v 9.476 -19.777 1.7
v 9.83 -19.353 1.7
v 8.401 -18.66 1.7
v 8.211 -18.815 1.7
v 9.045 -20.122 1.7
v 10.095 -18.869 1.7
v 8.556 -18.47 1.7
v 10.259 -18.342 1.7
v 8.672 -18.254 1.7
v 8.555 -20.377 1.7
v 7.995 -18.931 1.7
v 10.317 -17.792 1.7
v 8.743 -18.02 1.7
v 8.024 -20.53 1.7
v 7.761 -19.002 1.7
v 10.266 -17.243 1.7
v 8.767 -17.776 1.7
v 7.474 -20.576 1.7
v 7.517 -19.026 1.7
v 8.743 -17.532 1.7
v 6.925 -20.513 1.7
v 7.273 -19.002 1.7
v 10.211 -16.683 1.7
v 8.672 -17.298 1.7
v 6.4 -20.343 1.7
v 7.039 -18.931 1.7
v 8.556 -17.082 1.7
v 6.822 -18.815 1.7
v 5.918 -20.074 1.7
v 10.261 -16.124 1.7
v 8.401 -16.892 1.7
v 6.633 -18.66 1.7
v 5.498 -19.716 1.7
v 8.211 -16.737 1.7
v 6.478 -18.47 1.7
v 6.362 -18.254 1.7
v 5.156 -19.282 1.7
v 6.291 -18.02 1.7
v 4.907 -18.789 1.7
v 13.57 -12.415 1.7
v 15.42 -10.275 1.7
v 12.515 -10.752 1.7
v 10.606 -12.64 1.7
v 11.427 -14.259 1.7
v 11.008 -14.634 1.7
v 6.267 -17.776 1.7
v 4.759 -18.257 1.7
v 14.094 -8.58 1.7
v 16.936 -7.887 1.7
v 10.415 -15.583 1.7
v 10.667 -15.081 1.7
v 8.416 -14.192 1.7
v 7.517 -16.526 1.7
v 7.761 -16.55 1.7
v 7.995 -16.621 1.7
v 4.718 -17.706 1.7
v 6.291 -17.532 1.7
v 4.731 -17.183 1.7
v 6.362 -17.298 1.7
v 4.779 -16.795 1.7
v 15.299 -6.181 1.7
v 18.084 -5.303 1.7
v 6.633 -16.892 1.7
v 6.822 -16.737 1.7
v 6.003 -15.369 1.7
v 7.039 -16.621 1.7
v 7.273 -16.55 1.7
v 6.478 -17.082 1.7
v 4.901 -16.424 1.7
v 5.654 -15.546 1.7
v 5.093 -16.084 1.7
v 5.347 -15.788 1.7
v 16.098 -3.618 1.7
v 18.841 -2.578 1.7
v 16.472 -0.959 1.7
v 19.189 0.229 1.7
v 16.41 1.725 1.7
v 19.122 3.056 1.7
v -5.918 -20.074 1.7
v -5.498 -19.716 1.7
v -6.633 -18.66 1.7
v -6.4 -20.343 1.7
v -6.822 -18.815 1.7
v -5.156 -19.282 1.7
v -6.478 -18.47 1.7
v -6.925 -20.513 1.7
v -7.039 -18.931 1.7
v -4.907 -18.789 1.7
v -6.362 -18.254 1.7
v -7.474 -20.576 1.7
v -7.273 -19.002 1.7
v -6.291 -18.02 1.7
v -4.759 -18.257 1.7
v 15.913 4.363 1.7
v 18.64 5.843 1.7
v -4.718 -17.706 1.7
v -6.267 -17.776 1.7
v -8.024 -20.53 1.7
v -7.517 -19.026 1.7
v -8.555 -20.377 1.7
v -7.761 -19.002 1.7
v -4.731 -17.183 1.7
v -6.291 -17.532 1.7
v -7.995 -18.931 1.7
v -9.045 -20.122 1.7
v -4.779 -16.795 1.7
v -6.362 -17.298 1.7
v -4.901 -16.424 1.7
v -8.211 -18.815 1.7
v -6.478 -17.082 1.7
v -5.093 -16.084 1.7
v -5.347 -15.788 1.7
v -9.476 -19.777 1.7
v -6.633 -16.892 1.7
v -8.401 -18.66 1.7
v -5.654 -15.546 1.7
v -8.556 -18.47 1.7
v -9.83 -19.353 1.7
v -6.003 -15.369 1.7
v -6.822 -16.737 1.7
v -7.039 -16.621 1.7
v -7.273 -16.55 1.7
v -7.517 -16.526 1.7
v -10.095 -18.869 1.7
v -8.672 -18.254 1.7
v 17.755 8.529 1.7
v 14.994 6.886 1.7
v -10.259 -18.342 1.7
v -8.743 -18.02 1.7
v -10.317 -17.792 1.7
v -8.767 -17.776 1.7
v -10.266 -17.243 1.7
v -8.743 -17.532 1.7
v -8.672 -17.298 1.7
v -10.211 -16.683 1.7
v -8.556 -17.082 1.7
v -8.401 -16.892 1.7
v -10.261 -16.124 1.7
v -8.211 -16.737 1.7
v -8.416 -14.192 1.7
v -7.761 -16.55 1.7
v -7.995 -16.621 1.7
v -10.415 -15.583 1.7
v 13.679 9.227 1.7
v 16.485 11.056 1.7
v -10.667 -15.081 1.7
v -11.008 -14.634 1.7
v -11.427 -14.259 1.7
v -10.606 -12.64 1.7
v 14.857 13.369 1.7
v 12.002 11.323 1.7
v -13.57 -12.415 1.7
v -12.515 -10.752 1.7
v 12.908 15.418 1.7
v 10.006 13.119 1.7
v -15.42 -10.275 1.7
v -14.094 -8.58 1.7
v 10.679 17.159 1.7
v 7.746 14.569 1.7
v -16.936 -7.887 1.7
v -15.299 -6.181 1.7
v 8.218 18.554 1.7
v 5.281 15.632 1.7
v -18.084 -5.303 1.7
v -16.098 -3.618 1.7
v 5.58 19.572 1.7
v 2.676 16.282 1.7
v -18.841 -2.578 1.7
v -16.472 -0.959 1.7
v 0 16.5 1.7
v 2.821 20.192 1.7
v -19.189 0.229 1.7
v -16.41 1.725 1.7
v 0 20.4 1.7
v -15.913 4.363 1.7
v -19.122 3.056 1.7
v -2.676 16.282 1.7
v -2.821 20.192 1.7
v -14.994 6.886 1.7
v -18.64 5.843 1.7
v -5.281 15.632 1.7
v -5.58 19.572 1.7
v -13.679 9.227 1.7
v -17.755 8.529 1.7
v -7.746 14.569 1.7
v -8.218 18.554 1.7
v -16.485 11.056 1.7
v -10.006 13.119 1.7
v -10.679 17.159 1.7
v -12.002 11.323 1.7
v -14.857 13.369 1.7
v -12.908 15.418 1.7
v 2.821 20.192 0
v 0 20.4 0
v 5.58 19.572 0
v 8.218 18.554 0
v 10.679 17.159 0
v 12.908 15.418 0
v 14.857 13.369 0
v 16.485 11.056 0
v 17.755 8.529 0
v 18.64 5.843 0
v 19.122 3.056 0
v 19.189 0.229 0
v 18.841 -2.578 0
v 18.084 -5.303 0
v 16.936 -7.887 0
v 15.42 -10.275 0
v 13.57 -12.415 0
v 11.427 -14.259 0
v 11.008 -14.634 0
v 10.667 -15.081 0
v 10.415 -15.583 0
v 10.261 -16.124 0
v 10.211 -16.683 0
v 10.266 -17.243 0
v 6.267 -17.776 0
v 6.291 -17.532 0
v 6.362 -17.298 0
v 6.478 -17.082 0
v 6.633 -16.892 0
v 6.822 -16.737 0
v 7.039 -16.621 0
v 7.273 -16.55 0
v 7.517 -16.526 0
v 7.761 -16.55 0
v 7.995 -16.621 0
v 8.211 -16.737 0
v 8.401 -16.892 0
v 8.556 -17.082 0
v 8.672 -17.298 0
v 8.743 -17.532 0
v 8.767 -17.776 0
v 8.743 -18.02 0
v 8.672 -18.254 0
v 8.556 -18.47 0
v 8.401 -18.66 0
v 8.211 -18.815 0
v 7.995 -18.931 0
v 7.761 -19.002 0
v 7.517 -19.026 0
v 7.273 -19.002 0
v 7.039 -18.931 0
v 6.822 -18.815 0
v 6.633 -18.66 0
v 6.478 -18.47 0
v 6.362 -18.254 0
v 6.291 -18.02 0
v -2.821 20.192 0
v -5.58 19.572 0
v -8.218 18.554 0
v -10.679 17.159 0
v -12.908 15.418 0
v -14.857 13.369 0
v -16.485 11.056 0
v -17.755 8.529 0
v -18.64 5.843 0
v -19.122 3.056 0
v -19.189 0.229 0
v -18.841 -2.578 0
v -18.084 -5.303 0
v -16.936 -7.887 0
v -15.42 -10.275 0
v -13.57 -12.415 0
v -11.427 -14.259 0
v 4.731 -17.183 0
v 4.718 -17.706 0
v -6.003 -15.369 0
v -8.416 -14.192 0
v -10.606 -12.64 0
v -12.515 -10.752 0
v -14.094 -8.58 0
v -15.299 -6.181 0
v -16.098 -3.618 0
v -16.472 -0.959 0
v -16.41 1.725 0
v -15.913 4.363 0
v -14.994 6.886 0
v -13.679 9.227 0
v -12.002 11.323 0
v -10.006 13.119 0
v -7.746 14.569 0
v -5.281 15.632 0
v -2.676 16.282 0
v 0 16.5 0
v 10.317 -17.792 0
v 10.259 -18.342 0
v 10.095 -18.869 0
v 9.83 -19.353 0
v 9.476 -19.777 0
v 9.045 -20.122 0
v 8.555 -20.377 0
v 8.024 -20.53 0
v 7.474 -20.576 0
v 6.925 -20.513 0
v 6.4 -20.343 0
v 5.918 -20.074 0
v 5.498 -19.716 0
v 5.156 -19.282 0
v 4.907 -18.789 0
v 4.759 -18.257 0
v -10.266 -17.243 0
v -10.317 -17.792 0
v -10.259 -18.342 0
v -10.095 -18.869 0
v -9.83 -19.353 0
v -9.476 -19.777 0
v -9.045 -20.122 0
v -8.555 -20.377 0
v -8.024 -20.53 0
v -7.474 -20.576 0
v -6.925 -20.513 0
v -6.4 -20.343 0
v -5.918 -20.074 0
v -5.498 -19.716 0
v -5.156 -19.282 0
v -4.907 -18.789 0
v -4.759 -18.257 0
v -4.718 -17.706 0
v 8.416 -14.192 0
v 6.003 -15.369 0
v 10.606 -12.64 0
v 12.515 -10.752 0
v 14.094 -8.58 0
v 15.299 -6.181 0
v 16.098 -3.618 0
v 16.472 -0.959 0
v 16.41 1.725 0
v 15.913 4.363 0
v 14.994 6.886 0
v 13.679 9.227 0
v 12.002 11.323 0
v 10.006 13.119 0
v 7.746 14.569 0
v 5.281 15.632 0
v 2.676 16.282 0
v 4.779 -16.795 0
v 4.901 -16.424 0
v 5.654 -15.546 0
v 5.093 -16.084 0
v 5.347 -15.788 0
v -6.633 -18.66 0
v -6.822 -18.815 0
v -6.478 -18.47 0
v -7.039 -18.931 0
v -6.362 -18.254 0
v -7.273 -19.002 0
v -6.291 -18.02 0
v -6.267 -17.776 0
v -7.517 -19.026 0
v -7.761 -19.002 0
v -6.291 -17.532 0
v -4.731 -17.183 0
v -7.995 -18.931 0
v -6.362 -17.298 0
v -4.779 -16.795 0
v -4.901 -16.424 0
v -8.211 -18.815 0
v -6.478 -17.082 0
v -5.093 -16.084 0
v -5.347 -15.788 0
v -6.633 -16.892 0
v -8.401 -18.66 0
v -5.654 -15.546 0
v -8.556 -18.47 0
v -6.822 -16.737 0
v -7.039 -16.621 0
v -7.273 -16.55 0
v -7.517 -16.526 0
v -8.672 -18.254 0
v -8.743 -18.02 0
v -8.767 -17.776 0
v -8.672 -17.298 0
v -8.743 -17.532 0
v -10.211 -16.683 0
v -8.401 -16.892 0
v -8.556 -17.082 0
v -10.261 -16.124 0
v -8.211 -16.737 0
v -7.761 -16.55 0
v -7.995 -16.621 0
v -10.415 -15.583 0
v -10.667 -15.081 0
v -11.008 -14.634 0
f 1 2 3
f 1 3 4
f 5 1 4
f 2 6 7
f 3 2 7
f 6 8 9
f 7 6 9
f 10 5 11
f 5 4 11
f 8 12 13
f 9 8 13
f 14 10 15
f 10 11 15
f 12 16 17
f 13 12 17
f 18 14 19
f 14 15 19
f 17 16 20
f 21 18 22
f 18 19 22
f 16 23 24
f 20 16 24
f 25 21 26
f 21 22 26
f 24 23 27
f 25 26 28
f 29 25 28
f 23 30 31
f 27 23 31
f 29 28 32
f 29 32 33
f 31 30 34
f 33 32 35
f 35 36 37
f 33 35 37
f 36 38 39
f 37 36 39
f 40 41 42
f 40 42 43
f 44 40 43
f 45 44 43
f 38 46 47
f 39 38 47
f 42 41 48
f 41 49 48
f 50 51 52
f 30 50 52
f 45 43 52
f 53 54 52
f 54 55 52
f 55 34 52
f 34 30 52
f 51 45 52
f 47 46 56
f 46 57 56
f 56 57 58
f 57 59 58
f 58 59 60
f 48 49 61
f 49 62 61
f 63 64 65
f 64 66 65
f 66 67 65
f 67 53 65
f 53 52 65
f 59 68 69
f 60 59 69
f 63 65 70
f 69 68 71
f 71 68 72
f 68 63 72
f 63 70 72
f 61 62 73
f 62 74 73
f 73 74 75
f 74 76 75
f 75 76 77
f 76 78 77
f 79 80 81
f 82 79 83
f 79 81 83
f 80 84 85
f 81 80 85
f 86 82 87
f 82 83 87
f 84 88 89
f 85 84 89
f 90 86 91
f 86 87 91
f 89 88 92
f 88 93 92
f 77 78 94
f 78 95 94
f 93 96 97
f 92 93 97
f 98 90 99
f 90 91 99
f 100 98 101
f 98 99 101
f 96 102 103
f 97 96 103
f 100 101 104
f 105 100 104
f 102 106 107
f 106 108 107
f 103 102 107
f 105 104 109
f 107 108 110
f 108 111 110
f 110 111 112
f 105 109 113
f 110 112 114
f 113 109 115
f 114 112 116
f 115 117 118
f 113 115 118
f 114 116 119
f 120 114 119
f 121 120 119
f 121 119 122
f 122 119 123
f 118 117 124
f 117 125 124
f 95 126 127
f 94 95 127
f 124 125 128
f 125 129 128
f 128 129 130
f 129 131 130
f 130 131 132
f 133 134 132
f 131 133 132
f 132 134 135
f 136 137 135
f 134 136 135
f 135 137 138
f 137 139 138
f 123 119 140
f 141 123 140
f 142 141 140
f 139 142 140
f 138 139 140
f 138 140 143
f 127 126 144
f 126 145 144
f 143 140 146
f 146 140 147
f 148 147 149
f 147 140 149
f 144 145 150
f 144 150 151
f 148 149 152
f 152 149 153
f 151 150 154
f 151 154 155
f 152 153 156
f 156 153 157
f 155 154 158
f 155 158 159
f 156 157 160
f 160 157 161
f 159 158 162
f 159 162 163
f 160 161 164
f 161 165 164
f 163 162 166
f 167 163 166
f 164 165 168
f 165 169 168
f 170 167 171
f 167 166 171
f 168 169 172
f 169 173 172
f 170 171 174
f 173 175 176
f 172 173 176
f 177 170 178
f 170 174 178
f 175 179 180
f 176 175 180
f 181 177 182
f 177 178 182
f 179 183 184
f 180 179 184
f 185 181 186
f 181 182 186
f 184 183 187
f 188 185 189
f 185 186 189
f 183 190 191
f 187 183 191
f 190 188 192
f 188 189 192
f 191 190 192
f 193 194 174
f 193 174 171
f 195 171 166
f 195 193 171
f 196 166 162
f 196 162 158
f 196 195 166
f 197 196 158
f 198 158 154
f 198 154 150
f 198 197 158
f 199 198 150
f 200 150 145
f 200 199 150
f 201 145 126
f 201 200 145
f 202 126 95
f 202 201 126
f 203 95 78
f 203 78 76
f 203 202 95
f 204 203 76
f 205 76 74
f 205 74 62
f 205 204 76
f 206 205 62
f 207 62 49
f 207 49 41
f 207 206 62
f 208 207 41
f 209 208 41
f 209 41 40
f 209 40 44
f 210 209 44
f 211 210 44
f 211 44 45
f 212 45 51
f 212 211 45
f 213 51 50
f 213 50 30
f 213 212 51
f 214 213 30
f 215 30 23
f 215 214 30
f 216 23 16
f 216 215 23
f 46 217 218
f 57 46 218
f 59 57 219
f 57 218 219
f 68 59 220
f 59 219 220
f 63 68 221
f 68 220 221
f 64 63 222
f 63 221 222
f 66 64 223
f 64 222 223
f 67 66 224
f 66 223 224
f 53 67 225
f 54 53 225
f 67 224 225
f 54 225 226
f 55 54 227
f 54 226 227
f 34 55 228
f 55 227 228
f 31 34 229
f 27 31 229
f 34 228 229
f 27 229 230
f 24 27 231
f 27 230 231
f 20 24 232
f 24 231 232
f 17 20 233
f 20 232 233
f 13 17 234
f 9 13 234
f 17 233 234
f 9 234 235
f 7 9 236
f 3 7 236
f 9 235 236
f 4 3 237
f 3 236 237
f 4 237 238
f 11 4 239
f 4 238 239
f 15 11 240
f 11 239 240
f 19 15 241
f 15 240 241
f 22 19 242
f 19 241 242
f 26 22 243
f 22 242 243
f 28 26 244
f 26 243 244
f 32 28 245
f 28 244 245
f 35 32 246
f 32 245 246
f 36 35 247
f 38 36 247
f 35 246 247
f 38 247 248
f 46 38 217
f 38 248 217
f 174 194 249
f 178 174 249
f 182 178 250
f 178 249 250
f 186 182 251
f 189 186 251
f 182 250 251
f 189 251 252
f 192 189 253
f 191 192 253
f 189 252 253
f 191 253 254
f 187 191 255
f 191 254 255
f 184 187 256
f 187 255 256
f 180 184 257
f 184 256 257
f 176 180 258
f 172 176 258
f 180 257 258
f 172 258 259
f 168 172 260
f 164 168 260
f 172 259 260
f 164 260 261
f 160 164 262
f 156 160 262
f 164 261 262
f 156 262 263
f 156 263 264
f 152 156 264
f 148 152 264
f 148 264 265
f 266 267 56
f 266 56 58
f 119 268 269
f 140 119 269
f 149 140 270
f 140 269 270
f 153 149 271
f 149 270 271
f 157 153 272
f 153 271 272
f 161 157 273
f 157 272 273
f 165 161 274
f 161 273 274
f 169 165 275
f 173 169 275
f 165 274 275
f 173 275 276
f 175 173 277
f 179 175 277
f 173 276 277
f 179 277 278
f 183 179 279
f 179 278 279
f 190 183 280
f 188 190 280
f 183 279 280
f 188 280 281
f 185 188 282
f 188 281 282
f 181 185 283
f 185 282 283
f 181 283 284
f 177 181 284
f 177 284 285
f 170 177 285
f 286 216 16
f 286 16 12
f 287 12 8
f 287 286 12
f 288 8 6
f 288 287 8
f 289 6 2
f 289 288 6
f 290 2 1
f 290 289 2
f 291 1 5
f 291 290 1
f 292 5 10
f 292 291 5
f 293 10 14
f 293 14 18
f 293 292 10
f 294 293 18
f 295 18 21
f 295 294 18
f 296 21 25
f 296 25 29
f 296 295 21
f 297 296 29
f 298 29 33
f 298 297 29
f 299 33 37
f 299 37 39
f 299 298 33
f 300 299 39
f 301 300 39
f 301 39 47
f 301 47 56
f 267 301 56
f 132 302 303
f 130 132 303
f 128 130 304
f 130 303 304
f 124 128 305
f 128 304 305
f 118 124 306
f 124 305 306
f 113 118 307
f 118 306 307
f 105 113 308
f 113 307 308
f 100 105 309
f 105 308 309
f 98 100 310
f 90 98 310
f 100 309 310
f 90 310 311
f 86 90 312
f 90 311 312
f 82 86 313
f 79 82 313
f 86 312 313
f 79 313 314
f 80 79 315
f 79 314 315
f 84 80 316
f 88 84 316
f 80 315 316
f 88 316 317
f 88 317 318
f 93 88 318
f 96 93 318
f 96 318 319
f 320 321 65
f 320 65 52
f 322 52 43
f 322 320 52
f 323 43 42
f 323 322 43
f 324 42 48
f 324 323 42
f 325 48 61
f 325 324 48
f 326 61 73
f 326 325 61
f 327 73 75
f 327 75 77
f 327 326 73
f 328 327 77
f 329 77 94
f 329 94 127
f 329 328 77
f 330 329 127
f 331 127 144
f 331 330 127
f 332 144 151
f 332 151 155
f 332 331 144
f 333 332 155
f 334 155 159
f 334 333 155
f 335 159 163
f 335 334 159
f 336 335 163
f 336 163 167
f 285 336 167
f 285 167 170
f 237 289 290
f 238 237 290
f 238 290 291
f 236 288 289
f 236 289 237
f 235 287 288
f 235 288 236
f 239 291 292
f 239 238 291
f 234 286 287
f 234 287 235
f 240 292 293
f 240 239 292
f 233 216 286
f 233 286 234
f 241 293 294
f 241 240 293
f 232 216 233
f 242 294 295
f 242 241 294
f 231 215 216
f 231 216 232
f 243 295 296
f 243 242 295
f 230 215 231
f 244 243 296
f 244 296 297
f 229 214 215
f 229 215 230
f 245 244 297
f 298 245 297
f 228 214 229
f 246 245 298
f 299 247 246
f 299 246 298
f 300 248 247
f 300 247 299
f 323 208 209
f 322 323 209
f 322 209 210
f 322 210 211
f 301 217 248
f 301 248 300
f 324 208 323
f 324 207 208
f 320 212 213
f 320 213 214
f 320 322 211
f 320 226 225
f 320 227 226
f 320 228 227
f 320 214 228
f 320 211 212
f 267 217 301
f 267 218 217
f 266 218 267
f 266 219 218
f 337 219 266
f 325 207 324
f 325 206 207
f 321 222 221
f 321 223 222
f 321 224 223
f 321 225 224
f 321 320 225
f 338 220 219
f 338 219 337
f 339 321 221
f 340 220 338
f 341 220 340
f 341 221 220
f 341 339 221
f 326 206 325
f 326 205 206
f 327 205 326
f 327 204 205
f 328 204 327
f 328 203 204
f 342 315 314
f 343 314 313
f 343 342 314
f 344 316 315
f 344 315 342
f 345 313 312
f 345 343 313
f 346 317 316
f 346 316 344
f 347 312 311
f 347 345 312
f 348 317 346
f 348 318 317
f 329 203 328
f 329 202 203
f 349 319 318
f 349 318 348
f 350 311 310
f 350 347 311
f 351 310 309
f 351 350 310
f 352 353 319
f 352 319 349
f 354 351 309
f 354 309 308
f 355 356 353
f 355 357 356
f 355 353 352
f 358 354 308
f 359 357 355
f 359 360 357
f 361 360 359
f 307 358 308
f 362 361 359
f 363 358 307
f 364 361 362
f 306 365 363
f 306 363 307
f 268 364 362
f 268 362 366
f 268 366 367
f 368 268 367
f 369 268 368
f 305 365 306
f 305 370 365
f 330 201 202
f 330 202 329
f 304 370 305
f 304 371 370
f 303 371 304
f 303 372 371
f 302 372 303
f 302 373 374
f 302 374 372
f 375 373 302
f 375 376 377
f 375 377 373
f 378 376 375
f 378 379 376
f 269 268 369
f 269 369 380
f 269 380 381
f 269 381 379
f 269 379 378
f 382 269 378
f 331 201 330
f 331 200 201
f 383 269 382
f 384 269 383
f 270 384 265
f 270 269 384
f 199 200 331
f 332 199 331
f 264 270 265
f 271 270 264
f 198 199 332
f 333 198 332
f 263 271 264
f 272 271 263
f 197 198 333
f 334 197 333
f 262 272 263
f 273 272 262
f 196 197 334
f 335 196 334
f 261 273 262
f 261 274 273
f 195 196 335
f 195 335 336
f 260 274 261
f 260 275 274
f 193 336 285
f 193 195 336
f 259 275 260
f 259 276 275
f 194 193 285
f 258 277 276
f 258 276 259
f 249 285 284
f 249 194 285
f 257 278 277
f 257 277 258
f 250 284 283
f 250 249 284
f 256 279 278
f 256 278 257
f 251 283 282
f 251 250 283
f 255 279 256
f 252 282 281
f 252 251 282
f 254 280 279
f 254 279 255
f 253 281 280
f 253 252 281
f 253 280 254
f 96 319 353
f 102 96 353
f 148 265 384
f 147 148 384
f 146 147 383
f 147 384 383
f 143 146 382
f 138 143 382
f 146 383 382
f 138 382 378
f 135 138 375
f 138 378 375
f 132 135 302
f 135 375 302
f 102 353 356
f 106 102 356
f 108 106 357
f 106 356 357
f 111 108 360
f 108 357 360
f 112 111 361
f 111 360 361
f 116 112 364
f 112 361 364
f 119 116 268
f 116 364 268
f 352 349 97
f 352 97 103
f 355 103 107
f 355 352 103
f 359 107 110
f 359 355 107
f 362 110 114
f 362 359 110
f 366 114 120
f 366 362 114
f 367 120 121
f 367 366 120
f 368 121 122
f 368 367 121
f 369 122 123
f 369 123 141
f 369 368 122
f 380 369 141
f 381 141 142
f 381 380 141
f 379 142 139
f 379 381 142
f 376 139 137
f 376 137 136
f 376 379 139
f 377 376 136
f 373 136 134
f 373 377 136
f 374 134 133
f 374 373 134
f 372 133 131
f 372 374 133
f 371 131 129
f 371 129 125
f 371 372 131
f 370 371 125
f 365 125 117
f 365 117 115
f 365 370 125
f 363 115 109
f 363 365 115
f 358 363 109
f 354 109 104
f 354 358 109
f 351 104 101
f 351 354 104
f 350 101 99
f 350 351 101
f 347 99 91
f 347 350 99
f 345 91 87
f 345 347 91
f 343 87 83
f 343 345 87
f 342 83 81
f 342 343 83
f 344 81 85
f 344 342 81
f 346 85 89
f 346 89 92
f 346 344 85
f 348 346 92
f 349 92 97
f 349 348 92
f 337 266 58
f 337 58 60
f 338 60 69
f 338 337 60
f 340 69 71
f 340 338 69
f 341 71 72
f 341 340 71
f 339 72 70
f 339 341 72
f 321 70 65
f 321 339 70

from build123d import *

# Parameters (mm, degrees)
SKETCH_2_R      = 1.25
EXTRUDE_1_DEPTH = 1.7


with BuildPart() as part:
    # Эскиз2 → Бобышка-Вытянуть1 (new body)
    with BuildSketch(Plane.XY):
        with BuildLine():
            Line((0, 16.5), (0, 20.4))
            ThreePointArc((0, 20.4), (-18.247161486, 7.202535297), (-11.42657443, -14.259327835))
            ThreePointArc((-11.42657443, -14.259327835), (-10.414964854, -15.583182123), (-10.265681334, -17.242597243))
            ThreePointArc((-10.265681334, -17.242597243), (-7.750266266, -20.566241003), (-4.717815883, -17.706491802))
            Line((-4.717815883, -17.706491802), (-4.730782246, -17.182866897))
            ThreePointArc((-4.730782246, -17.182866897), (-5.092718531, -16.084006582), (-6.002583463, -15.369417418))
            ThreePointArc((-6.002583463, -15.369417418), (-16.21489111, 3.054063899), (0, 16.5))
        make_face()
        with Locations((-7.516953538, -17.77597844)):
            Circle(SKETCH_2_R, mode=Mode.SUBTRACT)
    extrude(amount=EXTRUDE_1_DEPTH)

    # Зеркальное отражение1: part across plane


with BuildPart() as part_1:
    add(part.part)
    add(part.part.mirror(Plane(origin=(0, 16.5, 1.7), x_dir=(0, 0, 1), z_dir=(-1, 0, 0))))


solid = part_1.part
